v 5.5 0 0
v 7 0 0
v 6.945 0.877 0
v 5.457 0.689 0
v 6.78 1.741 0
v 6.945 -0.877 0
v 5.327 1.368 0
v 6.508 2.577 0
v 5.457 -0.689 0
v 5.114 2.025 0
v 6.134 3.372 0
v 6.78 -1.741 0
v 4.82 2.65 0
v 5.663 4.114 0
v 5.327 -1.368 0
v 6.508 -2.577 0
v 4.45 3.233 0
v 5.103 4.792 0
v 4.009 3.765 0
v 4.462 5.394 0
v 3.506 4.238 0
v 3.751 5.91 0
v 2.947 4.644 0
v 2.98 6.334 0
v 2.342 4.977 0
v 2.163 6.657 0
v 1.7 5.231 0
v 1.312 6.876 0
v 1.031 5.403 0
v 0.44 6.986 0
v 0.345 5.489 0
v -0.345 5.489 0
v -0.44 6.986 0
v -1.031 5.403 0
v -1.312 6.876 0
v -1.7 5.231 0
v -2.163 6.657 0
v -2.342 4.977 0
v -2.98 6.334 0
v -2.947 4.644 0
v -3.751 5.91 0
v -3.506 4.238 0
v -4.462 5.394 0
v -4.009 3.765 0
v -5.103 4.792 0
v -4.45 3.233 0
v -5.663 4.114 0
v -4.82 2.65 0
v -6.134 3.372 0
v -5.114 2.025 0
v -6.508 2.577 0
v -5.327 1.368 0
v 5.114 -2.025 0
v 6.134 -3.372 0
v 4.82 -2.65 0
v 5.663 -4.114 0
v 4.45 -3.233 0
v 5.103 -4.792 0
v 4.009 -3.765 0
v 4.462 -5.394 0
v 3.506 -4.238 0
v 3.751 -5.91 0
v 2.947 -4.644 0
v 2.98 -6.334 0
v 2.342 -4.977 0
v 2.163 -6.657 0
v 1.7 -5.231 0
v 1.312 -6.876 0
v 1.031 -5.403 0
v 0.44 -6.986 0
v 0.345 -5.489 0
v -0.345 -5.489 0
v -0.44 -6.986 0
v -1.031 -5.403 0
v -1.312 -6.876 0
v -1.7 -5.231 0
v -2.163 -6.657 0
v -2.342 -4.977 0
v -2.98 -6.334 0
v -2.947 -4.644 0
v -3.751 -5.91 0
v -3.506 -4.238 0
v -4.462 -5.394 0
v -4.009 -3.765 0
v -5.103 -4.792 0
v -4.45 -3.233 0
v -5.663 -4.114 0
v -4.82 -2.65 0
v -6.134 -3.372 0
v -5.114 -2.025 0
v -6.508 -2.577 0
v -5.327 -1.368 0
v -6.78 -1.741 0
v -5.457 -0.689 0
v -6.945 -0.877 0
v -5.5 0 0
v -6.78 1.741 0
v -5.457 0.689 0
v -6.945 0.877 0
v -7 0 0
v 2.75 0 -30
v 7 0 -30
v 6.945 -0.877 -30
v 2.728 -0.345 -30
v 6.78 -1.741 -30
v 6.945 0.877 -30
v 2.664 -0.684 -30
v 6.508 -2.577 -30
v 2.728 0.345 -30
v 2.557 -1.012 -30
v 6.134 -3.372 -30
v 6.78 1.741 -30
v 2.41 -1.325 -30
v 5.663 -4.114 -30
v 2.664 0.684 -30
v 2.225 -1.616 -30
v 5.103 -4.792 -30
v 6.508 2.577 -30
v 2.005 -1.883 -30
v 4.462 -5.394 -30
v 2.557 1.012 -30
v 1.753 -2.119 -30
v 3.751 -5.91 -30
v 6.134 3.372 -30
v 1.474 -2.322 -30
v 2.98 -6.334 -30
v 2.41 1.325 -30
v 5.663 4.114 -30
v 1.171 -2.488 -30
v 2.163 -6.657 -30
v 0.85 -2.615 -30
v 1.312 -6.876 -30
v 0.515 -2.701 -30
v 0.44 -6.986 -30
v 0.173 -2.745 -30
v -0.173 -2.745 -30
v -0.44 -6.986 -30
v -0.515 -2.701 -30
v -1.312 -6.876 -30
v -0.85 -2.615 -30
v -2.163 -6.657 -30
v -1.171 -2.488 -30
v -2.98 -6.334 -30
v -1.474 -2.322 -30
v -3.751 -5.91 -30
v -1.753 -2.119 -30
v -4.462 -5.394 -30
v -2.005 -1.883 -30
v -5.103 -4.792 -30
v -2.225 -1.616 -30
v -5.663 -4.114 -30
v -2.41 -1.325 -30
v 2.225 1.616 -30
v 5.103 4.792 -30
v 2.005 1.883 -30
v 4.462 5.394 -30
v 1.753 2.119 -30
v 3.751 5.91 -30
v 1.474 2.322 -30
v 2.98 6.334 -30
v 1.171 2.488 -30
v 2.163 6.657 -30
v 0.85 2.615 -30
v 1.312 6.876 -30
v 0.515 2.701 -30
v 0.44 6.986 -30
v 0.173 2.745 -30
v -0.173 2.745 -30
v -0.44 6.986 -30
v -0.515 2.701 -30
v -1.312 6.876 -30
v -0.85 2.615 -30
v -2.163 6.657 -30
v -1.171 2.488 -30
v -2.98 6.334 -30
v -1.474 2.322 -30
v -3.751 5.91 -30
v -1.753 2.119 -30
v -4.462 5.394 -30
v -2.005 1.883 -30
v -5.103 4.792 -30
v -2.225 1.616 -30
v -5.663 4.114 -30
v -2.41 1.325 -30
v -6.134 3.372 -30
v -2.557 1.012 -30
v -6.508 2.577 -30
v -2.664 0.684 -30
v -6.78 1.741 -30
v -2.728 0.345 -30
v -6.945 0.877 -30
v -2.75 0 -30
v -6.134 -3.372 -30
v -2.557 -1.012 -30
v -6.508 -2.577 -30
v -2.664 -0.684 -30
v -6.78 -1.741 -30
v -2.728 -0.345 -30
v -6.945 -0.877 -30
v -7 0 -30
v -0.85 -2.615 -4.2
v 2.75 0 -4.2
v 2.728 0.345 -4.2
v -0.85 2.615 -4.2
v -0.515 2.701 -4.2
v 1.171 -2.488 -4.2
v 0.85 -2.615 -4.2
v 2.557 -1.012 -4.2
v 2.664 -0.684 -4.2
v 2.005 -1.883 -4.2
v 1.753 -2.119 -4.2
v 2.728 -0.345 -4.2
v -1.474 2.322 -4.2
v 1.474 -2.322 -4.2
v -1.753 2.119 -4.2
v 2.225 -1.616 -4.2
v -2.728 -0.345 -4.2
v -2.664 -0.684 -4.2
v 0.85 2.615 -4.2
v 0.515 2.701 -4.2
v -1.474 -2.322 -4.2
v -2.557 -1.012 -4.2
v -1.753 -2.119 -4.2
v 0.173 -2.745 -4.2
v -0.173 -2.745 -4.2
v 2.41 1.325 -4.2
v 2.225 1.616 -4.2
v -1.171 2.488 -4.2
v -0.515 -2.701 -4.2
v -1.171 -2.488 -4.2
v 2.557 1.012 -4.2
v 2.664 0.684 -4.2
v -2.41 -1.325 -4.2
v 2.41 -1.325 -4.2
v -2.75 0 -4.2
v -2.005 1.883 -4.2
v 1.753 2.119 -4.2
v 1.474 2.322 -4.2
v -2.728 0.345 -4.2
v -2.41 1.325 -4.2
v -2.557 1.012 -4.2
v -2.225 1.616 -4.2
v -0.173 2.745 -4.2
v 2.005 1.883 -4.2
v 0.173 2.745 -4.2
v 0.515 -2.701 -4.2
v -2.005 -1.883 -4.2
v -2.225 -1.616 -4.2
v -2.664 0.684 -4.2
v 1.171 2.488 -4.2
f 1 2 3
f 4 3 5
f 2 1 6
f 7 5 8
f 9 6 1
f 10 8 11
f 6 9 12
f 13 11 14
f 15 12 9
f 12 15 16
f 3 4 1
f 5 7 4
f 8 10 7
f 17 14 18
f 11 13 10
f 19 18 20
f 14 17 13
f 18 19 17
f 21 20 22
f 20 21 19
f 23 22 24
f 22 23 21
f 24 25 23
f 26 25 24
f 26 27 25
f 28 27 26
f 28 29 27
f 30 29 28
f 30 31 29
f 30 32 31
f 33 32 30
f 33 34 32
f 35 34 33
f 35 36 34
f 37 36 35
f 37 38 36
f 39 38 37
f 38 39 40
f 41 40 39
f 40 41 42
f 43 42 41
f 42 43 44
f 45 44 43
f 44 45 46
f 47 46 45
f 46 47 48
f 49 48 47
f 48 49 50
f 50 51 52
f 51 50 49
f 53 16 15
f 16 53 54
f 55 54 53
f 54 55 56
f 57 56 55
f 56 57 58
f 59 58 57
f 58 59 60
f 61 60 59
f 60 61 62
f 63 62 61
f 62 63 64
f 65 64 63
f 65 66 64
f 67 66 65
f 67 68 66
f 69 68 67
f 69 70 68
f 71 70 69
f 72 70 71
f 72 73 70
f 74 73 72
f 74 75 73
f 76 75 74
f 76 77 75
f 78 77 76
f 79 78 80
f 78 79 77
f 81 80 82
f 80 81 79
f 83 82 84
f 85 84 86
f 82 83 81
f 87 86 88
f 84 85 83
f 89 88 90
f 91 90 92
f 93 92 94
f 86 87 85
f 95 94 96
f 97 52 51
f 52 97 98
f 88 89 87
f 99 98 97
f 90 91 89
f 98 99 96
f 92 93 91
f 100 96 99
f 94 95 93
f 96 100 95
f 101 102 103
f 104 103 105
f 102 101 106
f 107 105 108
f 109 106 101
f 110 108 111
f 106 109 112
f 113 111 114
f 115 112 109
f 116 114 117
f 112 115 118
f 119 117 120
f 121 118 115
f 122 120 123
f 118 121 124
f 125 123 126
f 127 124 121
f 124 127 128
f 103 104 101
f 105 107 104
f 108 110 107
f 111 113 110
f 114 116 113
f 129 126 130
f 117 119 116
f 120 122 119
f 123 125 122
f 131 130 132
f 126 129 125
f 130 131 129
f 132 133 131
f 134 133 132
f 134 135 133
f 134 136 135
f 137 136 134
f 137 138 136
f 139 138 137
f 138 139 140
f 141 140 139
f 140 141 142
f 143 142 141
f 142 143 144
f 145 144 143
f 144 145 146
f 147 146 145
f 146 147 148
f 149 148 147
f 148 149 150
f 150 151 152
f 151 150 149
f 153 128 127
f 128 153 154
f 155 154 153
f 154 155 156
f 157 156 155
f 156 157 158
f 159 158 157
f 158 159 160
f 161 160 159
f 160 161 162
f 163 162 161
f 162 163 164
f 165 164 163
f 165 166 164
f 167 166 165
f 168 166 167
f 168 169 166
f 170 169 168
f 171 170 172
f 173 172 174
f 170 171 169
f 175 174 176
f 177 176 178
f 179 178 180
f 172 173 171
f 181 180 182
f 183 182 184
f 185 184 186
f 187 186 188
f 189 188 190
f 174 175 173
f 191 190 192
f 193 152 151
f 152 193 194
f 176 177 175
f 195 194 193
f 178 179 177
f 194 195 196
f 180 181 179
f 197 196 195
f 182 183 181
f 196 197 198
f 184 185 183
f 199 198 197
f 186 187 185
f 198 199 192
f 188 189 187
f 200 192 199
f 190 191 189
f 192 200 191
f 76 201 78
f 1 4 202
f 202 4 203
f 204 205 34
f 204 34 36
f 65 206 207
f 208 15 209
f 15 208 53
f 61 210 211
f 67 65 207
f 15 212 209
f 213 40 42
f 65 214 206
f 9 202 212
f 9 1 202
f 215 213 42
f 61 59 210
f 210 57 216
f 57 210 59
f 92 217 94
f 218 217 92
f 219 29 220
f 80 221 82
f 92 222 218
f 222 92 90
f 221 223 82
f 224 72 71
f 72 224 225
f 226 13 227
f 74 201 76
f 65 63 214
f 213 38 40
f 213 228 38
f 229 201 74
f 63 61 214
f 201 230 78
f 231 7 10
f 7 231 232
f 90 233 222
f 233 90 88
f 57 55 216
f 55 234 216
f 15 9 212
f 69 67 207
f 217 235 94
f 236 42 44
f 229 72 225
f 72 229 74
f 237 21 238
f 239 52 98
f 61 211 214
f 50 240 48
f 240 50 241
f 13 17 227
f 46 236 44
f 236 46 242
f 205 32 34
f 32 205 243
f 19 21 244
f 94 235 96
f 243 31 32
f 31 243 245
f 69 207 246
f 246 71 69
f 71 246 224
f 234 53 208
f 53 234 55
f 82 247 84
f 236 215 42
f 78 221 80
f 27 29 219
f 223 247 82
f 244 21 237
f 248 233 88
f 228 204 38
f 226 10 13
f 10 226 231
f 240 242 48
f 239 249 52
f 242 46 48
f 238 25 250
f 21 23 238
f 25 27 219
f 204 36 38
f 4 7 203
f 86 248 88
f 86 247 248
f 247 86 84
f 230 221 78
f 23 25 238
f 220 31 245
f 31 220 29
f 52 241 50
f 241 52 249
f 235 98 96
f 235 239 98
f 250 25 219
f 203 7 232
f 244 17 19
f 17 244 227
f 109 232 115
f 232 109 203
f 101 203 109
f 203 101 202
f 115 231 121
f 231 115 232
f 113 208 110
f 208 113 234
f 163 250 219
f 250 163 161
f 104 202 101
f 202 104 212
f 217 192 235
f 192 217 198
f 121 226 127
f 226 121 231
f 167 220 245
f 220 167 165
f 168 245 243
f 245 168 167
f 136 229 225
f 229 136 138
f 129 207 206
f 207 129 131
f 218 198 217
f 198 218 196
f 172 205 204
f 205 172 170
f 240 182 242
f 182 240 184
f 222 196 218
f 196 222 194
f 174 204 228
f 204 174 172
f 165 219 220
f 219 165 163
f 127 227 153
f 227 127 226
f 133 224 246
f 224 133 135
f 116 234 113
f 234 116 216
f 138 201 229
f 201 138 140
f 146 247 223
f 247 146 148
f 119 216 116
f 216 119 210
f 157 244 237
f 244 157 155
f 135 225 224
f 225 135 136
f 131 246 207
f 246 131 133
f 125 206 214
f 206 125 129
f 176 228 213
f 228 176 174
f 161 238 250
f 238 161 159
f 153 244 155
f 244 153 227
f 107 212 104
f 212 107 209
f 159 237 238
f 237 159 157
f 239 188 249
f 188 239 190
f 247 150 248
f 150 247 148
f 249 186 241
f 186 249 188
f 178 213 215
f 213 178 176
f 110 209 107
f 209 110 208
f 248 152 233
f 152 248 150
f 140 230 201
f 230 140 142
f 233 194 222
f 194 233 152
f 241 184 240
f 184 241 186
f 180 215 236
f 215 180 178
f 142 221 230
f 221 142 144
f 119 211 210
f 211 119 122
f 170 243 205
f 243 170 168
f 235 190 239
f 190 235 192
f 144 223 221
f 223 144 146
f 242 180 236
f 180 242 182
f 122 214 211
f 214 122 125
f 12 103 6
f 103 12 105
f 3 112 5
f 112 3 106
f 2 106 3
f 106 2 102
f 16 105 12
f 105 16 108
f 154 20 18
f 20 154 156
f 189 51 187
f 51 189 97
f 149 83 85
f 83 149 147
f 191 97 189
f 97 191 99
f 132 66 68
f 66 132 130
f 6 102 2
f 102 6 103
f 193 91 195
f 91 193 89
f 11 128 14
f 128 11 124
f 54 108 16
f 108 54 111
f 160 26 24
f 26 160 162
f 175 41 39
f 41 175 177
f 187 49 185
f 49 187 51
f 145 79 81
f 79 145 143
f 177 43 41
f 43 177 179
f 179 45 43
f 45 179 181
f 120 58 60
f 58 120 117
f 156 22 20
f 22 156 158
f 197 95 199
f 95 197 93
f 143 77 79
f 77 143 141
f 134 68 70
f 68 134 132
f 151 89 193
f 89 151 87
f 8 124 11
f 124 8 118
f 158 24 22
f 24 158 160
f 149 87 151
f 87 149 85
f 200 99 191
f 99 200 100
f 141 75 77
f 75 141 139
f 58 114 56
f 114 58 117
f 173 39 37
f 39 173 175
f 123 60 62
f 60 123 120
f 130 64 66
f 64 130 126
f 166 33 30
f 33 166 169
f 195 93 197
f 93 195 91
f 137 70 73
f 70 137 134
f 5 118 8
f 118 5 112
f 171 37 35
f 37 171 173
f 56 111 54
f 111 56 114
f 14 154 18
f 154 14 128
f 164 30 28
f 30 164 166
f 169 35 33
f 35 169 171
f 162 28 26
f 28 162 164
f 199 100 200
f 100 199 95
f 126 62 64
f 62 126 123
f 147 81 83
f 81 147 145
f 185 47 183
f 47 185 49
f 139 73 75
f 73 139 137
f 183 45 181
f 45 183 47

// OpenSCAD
$fn = 50;


difference() {
	union() {
		translate(v = [0, 0, -30.0000000000]) {
			cylinder(h = 30, r = 7.0000000000);
		}
		cylinder(h = 0, r = 10.0000000000);
	}
	union() {
		translate(v = [0, 0, 0]) {
			rotate(a = [0, 0, 0]) {
				difference() {
					union() {
						#translate(v = [0, 0, -30.0000000000]) {
							cylinder(h = 30, r = 2.2500000000);
						}
						#translate(v = [0, 0, -4.2000000000]) {
							cylinder(h = 4.2000000000, r = 7.0000000000, r1 = 2.7500000000, r2 = 5.5000000000);
						}
						#translate(v = [0, 0, -30.0000000000]) {
							cylinder(h = 30, r = 2.7500000000);
						}
						#translate(v = [0, 0, -30.0000000000]) {
							cylinder(h = 30, r = 2.2500000000);
						}
					}
					union();
				}
			}
		}
	}
}
